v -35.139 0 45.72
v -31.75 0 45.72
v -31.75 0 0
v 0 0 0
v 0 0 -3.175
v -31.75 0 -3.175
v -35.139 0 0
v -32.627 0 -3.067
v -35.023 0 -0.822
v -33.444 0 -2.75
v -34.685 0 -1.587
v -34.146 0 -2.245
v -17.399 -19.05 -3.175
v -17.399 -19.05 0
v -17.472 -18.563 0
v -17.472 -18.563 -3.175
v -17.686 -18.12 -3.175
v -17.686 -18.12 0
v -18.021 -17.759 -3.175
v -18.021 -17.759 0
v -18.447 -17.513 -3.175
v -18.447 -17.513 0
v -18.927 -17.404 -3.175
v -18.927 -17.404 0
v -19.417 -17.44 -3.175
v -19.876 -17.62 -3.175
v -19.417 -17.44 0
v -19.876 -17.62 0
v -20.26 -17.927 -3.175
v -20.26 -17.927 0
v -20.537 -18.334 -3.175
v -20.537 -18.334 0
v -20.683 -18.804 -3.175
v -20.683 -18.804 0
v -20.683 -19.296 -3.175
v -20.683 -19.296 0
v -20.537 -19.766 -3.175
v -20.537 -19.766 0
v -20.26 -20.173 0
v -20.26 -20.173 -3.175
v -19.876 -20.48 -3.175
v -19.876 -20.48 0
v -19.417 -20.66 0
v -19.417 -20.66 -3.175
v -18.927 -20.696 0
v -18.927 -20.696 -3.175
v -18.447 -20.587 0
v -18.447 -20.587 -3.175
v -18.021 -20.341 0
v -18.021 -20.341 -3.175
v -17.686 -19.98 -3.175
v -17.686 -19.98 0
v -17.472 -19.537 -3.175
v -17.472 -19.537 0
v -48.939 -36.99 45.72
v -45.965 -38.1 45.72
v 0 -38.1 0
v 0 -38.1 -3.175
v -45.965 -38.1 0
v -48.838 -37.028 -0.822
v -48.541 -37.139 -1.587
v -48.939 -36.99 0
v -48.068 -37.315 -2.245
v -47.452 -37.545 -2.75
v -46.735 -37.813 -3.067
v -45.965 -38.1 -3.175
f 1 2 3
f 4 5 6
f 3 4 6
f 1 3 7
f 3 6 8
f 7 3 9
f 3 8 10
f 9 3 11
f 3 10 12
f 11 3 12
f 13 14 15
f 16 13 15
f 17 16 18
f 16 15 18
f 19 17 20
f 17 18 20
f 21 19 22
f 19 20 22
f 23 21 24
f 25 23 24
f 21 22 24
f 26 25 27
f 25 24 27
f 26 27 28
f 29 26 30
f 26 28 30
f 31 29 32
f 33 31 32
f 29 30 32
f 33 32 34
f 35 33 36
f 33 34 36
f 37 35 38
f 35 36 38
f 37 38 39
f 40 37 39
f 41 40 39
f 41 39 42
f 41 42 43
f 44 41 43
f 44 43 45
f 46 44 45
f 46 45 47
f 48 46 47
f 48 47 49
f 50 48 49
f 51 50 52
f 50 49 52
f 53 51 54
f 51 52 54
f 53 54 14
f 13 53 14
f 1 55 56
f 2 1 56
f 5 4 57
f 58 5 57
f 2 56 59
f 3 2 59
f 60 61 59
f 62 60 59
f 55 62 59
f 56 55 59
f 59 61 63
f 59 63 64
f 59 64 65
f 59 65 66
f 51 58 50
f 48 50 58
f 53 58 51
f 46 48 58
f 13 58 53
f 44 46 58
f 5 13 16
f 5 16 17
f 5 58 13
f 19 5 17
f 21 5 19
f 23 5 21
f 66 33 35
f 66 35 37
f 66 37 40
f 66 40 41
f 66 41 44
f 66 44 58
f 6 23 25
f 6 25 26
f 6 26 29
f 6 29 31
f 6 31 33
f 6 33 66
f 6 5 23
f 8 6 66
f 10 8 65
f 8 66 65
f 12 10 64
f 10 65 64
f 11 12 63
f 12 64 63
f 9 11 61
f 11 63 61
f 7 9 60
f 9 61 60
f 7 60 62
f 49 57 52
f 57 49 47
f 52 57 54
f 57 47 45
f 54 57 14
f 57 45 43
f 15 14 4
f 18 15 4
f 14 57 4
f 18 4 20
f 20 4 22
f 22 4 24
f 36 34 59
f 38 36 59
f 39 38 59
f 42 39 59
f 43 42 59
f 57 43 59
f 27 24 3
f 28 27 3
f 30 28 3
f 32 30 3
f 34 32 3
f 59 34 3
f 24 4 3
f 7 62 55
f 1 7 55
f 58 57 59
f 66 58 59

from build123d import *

# Parameters (mm, degrees)
SKETCH13_R              = 1.651
BASE_FLANGE5_DEPTH      = 3.175
EDGE_FLANGE4_START      = -51.763631849
EDGE_FLANGE4_DEPTH      = 40.665312179
CUT_EXTRUDE4_DEPTH      = 53.975
CUT_EXTRUDE4_DEPTH_BACK = 5.588


# Read off the part's stored shape, not the designer's step: Edge-Flange4
# Sheet-metal steps are written as plain solids
with BuildPart() as part:
    # Sketch13 → Base-Flange5 (new body)
    with BuildSketch(Plane.XY):
        Polygon((-31.75, 0), (0, 0), (0, -38.1), (-45.964697135, -38.1), align=None)
        with Locations((-19.05, -19.05)):
            Circle(SKETCH13_R, mode=Mode.SUBTRACT)
    extrude(amount=-BASE_FLANGE5_DEPTH)

    # Edge-Flange4 outline → Edge-Flange4 (add)
    with BuildSketch(Plane(origin=(0, 0, 0), x_dir=(0.9369164518419233, -0.34955337542060905, 0), z_dir=(0.34955337542060905, 0.9369164518419232, 0)).offset(EDGE_FLANGE4_START)):
        with BuildLine():
            Line((-29.747097346, -45.72), (-29.747097346, 3.175))
            ThreePointArc((-29.747097346, 3.175), (-31.992161376, 2.24506403), (-32.922097346, 0))
            Line((-32.922097346, 0), (-32.922097346, -45.72))
            Line((-32.922097346, -45.72), (-29.747097346, -45.72))
        make_face()
    extrude(amount=EDGE_FLANGE4_DEPTH)

    # Sketch51 → Cut-Extrude4 (cut, two sides: drawn at the far end of the back side and taken through both)
    with BuildSketch(Plane.XY.offset(-CUT_EXTRUDE4_DEPTH_BACK)):
        Polygon((-31.75, 0), (-35.138776015, 0), (-34.724709735, 1.109831967), align=None)
    extrude(amount=CUT_EXTRUDE4_DEPTH + CUT_EXTRUDE4_DEPTH_BACK, mode=Mode.SUBTRACT)


solid = part.part
